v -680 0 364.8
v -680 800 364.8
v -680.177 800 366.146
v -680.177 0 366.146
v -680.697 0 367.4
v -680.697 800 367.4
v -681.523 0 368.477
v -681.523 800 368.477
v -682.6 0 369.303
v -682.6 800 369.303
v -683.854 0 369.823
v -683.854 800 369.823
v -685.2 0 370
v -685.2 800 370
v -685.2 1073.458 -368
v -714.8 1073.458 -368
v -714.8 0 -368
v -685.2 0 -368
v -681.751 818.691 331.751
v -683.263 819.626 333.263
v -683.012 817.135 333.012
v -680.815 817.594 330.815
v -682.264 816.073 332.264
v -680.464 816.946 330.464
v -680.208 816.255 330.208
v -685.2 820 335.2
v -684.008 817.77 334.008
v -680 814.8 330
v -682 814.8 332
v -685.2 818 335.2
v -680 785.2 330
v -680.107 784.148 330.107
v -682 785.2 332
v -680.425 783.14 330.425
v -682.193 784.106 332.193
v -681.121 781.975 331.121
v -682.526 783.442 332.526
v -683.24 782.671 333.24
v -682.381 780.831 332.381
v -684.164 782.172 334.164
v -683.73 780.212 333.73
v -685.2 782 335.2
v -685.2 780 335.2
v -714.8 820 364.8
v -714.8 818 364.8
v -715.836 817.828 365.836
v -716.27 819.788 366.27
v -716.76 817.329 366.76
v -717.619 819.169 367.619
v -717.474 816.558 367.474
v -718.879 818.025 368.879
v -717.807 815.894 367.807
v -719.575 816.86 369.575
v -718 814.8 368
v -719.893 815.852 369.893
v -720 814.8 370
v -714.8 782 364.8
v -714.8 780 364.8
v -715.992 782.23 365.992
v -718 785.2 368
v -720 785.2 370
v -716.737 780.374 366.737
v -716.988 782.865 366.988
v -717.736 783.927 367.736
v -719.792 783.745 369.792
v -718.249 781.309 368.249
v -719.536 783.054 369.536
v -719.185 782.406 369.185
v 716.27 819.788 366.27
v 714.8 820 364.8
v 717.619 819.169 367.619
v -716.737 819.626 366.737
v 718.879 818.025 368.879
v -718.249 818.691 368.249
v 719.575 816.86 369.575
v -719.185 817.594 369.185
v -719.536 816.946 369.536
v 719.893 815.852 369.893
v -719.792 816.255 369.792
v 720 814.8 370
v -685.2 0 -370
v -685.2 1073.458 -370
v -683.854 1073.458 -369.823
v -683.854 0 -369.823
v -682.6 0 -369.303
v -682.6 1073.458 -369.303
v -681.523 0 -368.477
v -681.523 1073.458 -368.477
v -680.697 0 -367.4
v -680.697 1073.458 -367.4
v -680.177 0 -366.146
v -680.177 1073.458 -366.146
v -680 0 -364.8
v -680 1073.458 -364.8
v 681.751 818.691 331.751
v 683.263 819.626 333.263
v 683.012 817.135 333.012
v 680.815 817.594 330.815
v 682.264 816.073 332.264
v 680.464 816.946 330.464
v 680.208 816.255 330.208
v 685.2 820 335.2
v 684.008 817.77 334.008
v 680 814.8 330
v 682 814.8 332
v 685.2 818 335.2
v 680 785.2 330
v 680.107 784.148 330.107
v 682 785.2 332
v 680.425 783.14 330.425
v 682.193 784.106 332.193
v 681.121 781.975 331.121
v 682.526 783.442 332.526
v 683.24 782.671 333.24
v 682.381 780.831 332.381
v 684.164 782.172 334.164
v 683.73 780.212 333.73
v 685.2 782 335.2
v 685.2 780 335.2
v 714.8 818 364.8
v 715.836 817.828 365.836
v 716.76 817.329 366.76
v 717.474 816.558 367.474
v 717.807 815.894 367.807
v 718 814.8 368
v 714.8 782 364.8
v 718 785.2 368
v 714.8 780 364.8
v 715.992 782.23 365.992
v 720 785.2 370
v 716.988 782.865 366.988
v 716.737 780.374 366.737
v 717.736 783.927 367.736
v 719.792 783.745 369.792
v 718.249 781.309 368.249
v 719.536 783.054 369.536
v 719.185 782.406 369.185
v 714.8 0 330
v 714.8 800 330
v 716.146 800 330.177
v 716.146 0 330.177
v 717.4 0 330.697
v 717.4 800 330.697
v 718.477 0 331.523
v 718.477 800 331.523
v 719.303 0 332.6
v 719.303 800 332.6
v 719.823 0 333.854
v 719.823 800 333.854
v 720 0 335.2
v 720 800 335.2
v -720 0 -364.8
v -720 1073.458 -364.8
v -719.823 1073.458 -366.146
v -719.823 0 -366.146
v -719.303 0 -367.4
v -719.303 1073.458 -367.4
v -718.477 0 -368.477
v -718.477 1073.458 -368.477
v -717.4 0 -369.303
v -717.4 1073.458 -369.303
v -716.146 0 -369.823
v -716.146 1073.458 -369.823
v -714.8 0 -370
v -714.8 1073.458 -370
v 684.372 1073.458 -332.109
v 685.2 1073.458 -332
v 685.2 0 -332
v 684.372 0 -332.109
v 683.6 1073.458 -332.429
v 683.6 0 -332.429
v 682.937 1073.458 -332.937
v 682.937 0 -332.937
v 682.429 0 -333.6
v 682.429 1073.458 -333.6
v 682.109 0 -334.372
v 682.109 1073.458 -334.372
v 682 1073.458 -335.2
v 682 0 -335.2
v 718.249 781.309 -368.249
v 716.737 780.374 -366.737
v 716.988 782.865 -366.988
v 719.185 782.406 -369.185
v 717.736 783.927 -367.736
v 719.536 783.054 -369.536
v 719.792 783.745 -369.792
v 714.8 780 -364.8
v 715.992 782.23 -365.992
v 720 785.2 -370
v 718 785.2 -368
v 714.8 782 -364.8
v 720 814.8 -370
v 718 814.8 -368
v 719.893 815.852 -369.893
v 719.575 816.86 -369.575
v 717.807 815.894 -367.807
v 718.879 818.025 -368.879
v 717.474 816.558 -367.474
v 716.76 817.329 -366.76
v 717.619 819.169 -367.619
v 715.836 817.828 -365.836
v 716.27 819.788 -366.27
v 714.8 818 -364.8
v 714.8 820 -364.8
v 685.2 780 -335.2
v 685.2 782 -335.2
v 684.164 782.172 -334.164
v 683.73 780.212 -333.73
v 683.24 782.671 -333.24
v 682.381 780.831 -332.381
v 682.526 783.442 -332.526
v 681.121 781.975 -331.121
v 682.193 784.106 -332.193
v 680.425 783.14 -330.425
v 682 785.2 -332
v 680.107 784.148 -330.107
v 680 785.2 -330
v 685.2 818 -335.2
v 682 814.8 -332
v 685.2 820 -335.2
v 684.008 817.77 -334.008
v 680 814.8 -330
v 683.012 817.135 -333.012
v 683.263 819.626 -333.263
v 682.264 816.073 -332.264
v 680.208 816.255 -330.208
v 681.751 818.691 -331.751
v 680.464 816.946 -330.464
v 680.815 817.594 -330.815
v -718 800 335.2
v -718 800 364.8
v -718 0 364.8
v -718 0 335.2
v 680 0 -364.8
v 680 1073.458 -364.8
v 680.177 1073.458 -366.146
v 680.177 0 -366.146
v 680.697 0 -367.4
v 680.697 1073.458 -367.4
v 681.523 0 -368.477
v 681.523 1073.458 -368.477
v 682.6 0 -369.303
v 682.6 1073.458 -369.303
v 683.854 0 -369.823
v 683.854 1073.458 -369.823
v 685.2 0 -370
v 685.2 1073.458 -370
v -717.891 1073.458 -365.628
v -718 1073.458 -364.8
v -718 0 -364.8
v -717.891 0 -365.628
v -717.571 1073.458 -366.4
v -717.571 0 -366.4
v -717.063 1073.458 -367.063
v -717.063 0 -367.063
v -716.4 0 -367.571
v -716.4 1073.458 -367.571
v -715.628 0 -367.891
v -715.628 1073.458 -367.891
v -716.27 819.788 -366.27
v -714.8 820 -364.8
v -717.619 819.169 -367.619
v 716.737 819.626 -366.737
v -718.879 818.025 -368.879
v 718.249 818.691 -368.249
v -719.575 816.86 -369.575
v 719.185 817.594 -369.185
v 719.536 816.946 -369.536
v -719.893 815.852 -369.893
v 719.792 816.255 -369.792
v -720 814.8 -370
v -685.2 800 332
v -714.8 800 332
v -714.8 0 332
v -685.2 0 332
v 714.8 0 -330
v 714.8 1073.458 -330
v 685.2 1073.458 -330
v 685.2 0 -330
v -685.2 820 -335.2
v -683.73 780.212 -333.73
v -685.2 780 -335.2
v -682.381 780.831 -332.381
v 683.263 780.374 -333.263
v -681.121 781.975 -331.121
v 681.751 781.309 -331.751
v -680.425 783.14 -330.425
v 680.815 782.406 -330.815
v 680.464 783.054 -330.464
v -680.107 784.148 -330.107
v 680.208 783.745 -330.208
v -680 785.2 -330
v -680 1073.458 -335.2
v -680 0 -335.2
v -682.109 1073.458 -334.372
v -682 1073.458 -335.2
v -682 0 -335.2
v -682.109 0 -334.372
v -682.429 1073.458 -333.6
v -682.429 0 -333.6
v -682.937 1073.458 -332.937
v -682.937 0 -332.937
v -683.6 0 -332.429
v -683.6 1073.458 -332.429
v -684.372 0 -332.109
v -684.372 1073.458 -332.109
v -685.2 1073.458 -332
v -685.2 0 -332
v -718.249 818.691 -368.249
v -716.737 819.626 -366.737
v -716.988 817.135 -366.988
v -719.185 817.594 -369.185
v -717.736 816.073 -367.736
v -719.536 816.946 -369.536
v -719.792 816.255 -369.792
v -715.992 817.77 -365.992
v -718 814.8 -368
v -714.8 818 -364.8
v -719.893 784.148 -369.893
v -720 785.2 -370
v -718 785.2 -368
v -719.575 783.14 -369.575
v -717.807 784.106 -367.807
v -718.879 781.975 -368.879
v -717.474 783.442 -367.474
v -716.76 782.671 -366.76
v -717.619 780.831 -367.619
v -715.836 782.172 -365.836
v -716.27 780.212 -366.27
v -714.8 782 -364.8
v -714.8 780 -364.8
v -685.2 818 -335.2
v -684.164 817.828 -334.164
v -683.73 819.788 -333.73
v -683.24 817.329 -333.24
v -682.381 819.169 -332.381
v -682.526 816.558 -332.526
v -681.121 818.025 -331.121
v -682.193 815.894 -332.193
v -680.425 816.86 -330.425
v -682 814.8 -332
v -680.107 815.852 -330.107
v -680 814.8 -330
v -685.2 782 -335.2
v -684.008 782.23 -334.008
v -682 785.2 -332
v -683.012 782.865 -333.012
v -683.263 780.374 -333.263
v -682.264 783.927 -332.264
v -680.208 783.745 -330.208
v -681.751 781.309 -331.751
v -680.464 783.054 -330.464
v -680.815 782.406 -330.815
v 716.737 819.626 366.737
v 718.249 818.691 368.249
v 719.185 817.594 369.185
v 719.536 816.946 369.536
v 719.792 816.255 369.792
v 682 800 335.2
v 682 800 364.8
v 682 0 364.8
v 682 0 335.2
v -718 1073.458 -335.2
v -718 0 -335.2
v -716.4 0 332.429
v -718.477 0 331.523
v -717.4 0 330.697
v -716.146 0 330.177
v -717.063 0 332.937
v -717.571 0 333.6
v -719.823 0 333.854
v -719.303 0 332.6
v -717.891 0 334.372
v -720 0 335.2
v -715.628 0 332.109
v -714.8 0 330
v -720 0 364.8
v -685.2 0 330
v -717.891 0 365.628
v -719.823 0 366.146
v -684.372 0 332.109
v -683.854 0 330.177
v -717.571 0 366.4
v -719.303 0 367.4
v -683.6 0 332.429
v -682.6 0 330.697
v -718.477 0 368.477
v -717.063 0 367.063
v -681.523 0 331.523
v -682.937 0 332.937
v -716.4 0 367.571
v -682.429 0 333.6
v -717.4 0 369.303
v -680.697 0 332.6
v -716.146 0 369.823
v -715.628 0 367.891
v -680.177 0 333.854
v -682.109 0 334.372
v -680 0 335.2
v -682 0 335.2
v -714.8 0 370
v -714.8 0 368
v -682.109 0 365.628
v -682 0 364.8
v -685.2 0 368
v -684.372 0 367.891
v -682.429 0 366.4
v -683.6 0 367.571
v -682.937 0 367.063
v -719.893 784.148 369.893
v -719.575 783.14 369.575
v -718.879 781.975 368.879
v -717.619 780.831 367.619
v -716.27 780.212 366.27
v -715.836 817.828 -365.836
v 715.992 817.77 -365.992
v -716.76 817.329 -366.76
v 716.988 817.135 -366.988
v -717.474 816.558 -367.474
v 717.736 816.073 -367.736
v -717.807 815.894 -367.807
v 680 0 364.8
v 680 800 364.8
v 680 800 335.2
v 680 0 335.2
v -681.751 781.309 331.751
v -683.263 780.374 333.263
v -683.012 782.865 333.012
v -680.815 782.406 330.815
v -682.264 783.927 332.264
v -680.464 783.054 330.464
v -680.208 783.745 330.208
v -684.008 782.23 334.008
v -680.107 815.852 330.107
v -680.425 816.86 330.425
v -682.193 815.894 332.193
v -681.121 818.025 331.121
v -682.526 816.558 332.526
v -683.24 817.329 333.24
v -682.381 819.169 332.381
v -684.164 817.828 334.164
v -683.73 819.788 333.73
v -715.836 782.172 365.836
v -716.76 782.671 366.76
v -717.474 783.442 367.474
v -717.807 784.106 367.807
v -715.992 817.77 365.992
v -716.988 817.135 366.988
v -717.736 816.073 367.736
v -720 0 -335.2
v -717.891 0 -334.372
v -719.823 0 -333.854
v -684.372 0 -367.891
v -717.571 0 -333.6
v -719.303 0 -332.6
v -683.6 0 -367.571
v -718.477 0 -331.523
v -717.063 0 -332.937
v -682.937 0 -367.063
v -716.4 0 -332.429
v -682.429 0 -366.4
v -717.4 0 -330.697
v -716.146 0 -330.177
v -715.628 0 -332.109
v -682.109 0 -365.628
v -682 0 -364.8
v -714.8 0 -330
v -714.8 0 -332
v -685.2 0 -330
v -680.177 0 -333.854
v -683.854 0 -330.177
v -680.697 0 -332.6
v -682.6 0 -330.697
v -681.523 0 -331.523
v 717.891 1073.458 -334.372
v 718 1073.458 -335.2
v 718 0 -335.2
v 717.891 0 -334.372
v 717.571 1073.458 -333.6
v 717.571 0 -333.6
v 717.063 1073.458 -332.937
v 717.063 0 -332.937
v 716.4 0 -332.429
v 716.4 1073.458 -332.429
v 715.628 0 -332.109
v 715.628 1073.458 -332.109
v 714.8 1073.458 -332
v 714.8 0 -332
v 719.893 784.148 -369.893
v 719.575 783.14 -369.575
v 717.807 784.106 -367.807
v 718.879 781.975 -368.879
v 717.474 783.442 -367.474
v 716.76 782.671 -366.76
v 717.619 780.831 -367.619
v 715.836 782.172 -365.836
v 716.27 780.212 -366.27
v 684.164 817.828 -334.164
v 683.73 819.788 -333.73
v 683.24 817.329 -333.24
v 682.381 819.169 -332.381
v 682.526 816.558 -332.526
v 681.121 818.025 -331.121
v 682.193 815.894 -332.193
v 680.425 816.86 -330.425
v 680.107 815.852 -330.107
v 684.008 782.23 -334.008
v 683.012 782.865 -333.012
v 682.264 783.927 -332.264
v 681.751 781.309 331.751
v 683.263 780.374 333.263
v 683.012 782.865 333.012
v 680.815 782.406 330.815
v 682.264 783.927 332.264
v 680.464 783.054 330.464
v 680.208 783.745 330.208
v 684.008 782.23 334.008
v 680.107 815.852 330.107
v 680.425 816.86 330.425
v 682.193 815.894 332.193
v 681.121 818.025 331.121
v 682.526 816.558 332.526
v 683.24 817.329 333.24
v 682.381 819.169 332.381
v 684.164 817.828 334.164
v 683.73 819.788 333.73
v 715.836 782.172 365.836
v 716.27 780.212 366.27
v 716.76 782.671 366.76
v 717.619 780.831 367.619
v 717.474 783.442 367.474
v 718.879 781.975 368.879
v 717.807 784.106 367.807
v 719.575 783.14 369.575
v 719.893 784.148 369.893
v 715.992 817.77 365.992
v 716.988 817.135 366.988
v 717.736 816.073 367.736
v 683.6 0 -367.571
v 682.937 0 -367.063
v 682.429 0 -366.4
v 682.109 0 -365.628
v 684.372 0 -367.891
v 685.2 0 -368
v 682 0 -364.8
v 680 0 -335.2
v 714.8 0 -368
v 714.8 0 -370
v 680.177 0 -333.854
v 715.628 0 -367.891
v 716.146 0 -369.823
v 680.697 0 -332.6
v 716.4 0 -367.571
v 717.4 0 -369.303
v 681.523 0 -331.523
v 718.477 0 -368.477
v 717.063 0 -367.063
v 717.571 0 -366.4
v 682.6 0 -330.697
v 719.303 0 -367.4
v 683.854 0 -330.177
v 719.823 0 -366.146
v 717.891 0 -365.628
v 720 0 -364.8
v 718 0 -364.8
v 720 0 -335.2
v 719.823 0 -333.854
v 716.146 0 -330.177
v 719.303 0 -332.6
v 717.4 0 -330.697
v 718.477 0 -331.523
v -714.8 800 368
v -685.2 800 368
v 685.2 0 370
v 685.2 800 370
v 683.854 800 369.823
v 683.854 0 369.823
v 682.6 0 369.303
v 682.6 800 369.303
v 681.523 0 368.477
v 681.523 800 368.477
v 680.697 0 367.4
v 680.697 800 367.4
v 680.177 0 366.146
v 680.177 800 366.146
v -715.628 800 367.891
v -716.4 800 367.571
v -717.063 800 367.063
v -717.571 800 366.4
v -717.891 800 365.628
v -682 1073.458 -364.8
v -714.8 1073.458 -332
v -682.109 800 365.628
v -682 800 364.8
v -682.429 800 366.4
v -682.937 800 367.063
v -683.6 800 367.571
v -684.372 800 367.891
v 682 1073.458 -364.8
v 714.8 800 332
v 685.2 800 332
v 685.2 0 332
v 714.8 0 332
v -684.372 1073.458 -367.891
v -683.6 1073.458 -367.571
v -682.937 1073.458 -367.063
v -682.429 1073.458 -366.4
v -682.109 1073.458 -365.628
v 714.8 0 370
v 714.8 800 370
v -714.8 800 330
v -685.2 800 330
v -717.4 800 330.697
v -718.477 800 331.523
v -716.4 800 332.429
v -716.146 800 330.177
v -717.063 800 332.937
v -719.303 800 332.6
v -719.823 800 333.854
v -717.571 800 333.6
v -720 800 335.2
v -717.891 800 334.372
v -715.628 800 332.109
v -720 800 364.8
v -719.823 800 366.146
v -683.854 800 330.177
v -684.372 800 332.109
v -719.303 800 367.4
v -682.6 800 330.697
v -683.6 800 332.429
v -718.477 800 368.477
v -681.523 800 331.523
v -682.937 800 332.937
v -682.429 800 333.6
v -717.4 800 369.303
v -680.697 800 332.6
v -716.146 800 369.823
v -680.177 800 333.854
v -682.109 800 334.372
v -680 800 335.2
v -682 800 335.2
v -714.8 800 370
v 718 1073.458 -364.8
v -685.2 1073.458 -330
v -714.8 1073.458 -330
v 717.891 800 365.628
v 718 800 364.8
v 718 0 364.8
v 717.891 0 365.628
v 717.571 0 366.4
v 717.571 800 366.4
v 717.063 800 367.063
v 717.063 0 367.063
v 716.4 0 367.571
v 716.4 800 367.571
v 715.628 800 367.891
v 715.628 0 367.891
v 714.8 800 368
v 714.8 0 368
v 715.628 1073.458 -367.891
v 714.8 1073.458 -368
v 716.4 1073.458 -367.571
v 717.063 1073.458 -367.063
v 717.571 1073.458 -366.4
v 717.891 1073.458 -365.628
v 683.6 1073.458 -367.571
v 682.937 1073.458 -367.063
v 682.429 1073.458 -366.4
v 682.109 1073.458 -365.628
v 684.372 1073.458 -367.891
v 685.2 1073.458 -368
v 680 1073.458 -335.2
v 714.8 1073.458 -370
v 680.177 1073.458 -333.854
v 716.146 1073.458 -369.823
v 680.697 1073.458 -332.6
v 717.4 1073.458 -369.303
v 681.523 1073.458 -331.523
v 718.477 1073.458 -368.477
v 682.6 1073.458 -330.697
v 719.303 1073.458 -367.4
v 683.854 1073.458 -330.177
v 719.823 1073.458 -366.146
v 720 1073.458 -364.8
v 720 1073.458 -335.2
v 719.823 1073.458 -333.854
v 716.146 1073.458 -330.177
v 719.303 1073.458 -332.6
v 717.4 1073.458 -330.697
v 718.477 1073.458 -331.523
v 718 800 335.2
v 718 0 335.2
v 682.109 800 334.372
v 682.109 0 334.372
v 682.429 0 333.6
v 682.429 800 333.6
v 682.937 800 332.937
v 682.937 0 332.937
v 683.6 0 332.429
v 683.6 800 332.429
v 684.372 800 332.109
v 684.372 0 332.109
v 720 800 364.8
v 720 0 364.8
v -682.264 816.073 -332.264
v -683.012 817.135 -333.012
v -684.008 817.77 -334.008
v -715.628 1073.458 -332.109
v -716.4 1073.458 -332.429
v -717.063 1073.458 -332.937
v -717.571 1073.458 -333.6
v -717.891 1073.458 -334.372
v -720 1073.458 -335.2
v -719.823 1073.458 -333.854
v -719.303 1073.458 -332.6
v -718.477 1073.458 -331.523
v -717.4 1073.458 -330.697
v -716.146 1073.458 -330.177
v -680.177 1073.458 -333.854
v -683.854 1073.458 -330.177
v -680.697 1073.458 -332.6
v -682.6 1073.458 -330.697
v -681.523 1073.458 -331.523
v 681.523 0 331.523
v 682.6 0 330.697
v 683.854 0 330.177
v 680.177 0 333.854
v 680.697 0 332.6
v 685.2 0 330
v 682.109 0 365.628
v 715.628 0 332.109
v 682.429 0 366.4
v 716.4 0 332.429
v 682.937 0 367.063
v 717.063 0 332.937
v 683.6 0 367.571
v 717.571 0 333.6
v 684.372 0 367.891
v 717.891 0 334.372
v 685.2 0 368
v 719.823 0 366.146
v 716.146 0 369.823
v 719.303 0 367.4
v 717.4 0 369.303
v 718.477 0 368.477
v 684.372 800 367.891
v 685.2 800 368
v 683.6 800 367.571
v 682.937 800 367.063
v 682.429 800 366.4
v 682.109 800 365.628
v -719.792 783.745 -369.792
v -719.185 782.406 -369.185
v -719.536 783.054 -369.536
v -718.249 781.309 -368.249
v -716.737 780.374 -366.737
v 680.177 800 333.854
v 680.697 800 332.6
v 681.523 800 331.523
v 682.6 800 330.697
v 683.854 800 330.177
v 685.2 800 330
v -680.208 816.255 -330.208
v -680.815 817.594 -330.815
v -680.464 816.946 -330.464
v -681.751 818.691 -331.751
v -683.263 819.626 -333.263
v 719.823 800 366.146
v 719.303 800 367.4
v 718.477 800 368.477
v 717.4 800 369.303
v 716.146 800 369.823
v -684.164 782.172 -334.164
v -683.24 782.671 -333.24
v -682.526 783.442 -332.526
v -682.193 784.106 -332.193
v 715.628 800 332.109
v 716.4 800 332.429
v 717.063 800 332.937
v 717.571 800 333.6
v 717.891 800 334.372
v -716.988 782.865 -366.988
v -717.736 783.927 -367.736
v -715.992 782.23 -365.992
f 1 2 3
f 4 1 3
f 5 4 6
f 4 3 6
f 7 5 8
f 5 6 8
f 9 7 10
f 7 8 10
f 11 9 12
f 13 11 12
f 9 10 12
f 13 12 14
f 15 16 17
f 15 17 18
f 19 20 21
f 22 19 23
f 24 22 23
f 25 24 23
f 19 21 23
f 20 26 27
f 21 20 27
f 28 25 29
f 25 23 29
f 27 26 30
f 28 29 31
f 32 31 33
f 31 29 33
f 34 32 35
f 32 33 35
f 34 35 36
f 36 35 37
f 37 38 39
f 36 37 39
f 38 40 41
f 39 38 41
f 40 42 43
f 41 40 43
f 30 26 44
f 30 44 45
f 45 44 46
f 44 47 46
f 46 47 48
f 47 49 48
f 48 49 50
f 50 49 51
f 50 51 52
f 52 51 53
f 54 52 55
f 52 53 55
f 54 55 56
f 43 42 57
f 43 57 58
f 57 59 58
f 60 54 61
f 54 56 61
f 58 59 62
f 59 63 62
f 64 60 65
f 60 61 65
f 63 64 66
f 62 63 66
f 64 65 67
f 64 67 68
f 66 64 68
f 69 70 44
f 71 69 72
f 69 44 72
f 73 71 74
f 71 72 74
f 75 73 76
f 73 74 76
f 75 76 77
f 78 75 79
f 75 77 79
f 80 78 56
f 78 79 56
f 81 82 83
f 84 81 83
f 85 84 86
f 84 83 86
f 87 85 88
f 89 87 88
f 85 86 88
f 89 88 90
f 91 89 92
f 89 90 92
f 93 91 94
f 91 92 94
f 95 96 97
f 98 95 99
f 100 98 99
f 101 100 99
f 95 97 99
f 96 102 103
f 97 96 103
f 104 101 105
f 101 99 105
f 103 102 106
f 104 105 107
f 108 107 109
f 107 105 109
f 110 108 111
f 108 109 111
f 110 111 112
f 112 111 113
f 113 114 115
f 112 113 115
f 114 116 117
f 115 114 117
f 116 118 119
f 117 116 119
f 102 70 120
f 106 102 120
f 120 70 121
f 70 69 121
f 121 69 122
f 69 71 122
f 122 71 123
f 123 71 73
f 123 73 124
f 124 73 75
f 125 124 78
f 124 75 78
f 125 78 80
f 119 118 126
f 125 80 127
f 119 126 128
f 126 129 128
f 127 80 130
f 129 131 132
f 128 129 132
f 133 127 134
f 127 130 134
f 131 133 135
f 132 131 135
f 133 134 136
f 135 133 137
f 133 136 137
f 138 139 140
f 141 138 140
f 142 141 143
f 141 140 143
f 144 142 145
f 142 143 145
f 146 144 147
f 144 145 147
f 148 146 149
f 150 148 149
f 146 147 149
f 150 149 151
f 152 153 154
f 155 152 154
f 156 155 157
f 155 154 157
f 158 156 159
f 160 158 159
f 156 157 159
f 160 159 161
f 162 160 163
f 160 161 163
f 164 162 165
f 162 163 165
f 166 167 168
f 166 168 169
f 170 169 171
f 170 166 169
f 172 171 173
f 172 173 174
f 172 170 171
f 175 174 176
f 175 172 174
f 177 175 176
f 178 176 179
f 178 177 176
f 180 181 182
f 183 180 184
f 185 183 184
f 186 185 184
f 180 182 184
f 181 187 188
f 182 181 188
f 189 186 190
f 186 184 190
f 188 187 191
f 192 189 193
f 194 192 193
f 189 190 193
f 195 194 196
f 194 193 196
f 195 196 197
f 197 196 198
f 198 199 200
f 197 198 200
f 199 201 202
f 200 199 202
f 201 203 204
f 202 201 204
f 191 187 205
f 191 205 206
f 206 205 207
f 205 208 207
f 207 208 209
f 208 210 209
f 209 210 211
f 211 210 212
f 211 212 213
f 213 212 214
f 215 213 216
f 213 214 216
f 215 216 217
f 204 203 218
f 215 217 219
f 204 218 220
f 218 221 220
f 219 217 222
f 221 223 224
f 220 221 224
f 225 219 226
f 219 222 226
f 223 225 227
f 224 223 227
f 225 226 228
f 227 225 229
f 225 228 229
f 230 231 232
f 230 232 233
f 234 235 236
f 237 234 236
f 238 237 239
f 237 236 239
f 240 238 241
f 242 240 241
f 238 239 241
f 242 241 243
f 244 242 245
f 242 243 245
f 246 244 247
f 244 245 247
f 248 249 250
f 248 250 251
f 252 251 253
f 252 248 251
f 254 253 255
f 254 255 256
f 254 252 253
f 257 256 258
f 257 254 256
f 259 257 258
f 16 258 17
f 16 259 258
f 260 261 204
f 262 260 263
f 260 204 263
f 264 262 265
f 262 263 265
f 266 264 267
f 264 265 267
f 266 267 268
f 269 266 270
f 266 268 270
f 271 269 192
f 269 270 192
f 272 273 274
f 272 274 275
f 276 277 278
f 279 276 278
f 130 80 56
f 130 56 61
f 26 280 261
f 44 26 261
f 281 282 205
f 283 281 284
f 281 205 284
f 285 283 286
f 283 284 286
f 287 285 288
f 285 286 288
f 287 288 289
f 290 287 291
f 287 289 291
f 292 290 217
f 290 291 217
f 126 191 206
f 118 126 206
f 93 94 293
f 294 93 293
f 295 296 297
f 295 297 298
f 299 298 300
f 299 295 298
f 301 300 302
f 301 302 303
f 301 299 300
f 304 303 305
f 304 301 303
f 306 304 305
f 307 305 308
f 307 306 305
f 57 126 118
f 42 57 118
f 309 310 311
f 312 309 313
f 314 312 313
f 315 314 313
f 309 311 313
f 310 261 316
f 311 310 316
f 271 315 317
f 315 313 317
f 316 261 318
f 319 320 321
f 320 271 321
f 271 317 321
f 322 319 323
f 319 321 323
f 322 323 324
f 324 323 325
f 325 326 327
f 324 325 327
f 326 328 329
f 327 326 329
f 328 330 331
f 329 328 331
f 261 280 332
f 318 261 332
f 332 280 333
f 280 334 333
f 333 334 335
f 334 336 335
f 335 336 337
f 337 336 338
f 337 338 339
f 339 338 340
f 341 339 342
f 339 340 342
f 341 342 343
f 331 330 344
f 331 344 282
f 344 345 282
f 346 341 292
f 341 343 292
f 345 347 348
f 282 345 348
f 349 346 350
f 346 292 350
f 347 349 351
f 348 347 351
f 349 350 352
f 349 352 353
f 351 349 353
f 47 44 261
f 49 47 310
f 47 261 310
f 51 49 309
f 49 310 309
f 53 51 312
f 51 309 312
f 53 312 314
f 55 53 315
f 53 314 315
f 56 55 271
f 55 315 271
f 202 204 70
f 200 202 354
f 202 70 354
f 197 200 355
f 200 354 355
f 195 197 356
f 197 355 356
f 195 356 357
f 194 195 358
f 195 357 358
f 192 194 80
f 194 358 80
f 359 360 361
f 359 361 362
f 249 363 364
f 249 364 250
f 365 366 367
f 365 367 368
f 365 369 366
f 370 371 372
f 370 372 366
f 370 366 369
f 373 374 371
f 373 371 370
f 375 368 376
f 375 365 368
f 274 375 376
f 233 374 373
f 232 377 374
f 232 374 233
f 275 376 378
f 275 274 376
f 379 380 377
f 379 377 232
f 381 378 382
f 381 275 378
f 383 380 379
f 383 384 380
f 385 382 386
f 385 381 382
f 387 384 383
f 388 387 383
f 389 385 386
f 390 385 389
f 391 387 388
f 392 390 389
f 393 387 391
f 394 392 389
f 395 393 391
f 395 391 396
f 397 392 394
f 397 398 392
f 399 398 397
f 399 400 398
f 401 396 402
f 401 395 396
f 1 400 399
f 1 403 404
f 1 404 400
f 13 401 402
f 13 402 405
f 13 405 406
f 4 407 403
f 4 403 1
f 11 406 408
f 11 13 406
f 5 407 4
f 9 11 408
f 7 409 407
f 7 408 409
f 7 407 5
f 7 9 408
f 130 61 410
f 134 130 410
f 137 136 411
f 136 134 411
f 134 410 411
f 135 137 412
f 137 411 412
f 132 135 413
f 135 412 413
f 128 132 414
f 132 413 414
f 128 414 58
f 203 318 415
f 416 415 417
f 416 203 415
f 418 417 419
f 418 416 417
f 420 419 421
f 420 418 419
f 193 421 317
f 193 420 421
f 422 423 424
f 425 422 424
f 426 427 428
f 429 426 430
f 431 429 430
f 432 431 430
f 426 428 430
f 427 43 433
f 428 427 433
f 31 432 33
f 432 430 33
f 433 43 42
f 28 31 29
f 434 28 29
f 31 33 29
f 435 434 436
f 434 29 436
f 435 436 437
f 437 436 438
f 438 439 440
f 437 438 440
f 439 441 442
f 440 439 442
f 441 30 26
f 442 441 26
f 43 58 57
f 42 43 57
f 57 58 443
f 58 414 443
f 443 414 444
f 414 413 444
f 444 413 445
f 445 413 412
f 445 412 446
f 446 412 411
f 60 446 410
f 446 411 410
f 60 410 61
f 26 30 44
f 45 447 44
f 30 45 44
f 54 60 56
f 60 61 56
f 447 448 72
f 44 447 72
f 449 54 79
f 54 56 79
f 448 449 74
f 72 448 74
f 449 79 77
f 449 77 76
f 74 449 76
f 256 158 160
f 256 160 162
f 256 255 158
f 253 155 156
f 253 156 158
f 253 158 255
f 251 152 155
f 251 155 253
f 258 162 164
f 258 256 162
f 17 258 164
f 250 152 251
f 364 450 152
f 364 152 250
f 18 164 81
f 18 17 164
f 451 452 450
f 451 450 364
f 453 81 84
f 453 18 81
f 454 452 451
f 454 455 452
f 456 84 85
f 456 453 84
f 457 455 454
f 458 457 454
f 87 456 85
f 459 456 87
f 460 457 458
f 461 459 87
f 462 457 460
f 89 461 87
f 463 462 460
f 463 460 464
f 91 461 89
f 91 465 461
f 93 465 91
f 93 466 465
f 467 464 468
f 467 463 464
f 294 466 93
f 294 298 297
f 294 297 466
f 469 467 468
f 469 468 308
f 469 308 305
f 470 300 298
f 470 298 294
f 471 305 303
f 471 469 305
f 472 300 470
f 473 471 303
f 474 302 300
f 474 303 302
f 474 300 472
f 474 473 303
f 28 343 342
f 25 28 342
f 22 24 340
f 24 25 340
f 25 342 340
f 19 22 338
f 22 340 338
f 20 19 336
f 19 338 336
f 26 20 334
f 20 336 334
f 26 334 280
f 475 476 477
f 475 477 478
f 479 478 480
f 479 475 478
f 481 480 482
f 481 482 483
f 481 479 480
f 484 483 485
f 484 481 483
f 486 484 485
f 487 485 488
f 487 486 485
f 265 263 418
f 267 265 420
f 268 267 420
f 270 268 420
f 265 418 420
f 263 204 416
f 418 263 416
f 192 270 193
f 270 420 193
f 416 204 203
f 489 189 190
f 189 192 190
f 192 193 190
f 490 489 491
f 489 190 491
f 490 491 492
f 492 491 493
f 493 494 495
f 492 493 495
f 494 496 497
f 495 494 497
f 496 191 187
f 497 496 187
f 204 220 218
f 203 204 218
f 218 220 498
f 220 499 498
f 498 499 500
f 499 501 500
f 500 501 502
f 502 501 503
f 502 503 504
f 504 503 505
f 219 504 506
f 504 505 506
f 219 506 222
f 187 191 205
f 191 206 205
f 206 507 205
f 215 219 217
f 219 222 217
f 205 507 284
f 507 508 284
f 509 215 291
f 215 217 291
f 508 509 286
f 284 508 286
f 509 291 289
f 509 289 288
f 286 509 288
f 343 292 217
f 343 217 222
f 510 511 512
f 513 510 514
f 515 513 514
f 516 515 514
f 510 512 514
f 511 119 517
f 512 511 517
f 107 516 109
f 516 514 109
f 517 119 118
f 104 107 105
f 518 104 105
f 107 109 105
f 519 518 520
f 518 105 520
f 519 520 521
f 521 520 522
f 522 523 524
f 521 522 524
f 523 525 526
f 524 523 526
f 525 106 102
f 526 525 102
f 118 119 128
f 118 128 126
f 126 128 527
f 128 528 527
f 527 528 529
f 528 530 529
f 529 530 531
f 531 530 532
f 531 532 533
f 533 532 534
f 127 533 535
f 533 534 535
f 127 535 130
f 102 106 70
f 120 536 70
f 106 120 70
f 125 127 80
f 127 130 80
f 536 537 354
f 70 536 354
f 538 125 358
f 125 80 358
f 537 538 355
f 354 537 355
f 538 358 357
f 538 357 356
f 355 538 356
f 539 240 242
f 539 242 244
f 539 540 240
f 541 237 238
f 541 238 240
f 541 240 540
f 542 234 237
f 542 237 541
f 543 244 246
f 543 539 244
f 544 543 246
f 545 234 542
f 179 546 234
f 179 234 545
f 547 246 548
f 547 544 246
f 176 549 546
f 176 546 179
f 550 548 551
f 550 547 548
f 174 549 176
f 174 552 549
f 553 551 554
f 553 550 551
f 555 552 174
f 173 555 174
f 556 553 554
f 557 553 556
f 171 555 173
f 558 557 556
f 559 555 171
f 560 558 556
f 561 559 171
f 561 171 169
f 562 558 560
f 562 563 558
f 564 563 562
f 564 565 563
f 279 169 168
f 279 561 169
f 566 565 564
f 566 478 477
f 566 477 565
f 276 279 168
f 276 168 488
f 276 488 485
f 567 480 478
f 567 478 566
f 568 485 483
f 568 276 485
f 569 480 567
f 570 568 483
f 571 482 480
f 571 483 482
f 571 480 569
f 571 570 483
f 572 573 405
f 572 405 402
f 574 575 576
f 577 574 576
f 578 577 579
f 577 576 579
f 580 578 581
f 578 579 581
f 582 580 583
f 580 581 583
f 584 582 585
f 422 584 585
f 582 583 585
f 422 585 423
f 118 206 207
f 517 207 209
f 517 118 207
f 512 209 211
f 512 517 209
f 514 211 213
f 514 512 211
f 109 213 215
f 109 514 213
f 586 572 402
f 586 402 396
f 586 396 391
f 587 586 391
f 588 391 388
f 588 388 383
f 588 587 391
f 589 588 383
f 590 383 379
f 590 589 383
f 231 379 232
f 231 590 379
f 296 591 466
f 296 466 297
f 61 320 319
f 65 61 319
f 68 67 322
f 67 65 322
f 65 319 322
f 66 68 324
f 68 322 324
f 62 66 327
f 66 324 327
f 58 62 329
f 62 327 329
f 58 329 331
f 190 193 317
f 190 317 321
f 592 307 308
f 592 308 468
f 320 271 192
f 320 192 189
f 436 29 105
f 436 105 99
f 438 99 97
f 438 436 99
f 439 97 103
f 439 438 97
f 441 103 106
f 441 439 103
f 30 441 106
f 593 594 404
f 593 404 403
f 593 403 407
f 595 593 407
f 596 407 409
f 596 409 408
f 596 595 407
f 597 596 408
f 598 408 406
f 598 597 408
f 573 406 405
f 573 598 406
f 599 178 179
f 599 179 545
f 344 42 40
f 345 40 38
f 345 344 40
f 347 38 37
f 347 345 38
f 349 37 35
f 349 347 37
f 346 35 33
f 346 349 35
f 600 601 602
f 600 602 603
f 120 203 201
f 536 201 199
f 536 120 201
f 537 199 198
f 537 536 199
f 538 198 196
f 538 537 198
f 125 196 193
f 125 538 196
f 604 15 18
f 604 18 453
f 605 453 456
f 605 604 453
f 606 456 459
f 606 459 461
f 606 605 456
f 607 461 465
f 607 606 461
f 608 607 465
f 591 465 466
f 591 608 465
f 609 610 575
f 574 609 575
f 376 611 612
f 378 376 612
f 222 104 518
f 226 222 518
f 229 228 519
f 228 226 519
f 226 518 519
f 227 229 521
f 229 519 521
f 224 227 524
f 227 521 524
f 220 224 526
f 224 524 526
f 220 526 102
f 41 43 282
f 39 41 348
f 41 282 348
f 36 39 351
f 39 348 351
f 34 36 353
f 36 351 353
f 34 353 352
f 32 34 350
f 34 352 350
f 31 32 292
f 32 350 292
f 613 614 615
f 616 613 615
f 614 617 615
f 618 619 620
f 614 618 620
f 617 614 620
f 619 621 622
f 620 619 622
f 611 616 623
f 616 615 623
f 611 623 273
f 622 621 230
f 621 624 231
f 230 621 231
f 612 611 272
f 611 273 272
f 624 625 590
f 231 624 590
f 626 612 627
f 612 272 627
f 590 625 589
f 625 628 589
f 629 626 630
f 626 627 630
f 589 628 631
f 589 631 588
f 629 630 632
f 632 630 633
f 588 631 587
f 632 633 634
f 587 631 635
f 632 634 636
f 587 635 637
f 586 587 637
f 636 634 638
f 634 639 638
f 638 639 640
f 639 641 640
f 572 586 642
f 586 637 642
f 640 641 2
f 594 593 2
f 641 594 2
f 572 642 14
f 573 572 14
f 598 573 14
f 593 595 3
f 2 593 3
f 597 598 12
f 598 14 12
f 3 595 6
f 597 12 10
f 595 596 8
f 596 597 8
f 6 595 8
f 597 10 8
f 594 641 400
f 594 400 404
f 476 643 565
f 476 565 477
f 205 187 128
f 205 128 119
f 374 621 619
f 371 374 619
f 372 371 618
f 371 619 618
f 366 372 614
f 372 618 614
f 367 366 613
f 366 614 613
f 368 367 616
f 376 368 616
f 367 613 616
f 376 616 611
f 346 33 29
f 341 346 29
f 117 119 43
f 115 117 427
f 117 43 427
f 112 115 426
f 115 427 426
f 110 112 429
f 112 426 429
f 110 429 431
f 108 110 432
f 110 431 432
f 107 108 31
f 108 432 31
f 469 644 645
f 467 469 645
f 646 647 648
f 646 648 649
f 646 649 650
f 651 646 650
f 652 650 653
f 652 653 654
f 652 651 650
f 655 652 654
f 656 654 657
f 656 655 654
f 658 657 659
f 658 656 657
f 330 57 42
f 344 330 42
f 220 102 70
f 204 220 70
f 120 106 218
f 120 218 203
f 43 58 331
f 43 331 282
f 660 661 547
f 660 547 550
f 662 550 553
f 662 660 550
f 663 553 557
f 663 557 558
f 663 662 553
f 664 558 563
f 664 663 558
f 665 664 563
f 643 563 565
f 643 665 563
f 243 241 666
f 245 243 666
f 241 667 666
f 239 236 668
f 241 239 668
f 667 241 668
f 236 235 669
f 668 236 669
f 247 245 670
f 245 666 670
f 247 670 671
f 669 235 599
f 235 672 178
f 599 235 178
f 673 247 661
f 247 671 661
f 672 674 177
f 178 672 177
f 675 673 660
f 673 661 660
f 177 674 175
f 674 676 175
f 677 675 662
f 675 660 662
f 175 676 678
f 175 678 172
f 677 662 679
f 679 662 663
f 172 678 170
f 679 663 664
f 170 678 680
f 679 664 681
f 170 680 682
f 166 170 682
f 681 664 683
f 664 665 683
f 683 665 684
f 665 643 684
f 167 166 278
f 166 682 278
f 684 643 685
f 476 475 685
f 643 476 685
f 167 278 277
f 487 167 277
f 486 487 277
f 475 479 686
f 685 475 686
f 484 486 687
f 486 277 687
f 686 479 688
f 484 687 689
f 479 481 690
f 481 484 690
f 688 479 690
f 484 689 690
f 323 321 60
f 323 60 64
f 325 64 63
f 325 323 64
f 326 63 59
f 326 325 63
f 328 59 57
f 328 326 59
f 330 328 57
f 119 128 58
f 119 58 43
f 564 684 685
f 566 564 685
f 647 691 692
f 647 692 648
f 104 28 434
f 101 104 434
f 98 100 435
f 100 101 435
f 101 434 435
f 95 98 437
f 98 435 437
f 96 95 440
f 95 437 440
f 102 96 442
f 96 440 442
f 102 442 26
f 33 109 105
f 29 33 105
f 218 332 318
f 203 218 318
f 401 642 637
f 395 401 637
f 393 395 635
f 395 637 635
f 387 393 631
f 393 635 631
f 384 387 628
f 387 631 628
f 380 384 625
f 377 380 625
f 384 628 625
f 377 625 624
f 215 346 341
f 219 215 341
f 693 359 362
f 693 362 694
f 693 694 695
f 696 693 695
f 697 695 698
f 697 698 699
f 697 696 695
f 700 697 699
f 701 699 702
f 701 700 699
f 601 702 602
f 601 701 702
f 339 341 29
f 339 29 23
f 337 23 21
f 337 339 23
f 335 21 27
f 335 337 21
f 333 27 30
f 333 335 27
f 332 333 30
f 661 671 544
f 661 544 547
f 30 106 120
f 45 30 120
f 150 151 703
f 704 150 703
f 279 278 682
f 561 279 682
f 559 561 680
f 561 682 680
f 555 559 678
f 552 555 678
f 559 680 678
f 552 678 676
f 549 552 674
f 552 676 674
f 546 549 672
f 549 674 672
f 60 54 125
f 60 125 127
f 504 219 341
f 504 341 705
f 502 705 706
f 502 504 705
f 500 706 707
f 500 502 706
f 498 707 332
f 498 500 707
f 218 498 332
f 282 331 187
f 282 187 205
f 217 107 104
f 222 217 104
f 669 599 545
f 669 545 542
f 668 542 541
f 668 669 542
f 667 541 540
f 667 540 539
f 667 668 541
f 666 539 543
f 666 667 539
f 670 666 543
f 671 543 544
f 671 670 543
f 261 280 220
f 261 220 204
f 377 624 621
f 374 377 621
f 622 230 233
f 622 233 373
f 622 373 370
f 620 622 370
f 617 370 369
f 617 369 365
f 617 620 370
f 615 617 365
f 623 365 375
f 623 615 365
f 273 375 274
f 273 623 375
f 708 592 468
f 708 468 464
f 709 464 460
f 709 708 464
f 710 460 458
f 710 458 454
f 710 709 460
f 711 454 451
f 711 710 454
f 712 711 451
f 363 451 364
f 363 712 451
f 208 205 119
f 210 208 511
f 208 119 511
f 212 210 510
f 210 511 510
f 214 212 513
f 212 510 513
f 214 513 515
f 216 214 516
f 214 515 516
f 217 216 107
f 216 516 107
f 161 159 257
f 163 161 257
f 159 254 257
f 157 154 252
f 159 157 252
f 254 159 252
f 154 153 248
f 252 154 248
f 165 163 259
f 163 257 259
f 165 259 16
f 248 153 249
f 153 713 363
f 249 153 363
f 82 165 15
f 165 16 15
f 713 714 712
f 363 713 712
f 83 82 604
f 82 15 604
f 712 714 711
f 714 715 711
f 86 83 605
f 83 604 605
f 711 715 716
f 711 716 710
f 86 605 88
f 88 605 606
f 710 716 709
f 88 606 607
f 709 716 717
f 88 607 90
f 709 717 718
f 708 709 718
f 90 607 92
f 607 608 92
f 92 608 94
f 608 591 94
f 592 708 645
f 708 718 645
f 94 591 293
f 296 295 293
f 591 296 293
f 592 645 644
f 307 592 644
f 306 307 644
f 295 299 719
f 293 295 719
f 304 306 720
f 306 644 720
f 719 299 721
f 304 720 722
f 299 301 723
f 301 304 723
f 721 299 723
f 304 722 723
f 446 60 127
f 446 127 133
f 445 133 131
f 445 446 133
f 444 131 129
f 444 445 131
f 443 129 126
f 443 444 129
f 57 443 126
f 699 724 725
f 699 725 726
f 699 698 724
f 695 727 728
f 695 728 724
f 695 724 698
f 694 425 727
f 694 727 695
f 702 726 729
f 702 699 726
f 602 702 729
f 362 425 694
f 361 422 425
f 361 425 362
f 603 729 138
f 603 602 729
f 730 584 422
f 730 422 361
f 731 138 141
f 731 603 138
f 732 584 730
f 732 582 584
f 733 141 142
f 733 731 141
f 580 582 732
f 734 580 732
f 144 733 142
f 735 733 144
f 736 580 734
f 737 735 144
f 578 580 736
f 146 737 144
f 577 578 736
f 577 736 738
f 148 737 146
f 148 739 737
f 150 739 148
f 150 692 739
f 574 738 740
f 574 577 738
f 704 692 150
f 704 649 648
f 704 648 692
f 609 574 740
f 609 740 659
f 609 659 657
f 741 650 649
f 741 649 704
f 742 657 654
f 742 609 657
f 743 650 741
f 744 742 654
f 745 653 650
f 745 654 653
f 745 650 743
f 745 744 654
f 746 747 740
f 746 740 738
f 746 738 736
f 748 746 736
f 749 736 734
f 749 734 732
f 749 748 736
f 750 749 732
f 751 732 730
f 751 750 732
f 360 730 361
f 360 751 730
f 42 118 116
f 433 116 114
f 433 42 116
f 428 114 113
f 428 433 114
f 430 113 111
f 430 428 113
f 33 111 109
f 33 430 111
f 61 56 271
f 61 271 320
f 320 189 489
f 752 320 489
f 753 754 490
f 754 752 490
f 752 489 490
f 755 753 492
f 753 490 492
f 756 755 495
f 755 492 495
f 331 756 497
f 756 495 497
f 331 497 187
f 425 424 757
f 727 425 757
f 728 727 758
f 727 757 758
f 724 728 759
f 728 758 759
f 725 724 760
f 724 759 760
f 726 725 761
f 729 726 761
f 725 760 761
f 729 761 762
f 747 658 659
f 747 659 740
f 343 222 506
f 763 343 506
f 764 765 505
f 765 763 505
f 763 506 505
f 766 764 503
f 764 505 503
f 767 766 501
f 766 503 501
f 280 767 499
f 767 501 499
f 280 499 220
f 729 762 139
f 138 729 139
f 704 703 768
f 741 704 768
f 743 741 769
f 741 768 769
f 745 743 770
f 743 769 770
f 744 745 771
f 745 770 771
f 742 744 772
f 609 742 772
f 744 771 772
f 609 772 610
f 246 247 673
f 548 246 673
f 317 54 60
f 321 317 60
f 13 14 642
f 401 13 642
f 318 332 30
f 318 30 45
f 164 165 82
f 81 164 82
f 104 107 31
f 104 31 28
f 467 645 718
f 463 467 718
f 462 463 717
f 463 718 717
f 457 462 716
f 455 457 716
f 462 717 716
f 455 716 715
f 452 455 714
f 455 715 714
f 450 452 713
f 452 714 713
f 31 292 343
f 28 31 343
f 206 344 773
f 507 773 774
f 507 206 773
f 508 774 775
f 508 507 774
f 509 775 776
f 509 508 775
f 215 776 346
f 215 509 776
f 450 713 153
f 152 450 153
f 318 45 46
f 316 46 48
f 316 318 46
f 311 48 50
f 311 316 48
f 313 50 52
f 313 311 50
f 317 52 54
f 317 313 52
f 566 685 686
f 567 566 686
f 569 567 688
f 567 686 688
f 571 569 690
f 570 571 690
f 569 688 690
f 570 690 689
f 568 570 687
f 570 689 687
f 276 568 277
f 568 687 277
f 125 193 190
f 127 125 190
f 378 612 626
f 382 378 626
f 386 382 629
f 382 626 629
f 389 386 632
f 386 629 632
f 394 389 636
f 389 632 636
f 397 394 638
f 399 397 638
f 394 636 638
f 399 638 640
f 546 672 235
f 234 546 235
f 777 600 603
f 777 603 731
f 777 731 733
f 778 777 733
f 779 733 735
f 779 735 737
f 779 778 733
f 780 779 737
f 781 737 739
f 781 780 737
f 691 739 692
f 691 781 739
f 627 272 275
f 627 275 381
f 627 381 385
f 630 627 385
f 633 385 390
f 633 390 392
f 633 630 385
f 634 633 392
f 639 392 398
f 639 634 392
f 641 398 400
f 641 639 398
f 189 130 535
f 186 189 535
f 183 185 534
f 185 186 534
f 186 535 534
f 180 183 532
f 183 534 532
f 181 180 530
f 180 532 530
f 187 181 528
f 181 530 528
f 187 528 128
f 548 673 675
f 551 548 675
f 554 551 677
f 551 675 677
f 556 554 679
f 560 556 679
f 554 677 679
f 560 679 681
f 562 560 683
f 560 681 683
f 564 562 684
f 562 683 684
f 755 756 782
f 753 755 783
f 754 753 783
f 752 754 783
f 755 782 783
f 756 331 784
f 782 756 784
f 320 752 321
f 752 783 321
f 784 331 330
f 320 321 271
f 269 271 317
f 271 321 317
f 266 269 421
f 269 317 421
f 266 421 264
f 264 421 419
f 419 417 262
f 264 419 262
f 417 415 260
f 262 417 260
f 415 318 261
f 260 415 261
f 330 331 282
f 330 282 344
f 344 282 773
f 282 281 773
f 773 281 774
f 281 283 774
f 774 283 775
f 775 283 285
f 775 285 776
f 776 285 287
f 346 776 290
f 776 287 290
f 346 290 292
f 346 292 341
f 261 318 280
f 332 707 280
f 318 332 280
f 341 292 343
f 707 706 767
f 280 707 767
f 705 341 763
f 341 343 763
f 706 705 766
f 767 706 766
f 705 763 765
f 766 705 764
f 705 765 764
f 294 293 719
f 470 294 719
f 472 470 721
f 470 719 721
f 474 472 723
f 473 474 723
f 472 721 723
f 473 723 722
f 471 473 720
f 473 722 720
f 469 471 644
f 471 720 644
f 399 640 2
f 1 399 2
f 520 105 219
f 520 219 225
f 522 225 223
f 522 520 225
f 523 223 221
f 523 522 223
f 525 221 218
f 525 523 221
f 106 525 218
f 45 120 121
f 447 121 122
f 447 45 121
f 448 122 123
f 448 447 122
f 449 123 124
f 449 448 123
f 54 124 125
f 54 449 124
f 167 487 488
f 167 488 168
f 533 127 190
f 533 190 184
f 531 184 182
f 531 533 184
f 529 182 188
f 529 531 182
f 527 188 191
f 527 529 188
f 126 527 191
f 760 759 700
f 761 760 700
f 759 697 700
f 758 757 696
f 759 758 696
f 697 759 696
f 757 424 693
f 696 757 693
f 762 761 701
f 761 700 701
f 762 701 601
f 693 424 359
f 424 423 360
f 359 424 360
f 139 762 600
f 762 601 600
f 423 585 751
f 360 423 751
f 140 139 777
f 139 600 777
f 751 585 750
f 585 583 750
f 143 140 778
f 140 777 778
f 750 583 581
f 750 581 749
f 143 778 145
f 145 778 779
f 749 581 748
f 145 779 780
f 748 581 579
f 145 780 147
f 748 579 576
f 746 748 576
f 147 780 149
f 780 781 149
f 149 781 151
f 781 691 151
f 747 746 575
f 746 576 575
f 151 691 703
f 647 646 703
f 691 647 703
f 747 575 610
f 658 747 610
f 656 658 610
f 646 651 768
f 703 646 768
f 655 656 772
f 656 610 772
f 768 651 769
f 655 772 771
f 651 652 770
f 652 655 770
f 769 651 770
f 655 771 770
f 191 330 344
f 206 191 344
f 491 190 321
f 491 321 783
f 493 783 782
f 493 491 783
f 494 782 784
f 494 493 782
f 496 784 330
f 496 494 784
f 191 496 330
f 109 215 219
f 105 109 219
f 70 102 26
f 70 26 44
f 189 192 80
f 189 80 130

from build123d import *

# Parameters (mm, degrees)
RECTANGULAR_TUBE_CONFIGURED_40_X_40_X_DEPTH      = 1429.284271247
RECTANGULAR_TUBE_CONFIGURED_40_X_40_X_DEPTH_BACK = 29.284271247
RECTANGULAR_TUBE_CONFIGURED_40_X_4_4_DEPTH       = 758.568542495
RECTANGULAR_TUBE_CONFIGURED_40_X_4_6_DEPTH       = 1458.568542495
RECTANGULAR_TUBE_CONFIGURED_40_X_4_8_DEPTH       = 758.568542495
RECTANGULAR_TUBE_CONFIGURED_40_X_4_10_DEPTH      = 1073.458017645
RECTANGULAR_TUBE_CONFIGURED_40_X_4_11_DEPTH      = 1073.458017645
RECTANGULAR_TUBE_CONFIGURED_40_X_4_12_DEPTH      = 800
RECTANGULAR_TUBE_CONFIGURED_40_X_4_13_DEPTH      = 800


with BuildPart() as part:
    # Sketch12 → Rectangular tube - configured 40 X 40 X (new, two sides: drawn at the far end of the back side and taken through both)
    with BuildSketch(Plane(origin=(-700, 800, 350), x_dir=(0, 0, -1), z_dir=(1, 0, 0)).offset(-RECTANGULAR_TUBE_CONFIGURED_40_X_40_X_DEPTH_BACK)):
        with BuildLine():
            Line((-14.8, -20), (14.8, -20))
            ThreePointArc((14.8, -20), (18.476955262, -18.476955262), (20, -14.8))
            Line((20, -14.8), (20, 14.8))
            ThreePointArc((20, 14.8), (18.476955262, 18.476955262), (14.8, 20))
            Line((14.8, 20), (-14.8, 20))
            ThreePointArc((-14.8, 20), (-18.476955262, 18.476955262), (-20, 14.8))
            Line((-20, 14.8), (-20, -14.8))
            ThreePointArc((-20, -14.8), (-18.476955262, -18.476955262), (-14.8, -20))
        make_face()
        with BuildLine():
            Line((-14.8, -18), (14.8, -18))
            ThreePointArc((14.8, -18), (17.0627417, -17.0627417), (18, -14.8))
            Line((18, -14.8), (18, 14.8))
            ThreePointArc((18, 14.8), (17.0627417, 17.0627417), (14.8, 18))
            Line((14.8, 18), (-14.8, 18))
            ThreePointArc((-14.8, 18), (-17.0627417, 17.0627417), (-18, 14.8))
            Line((-18, 14.8), (-18, -14.8))
            ThreePointArc((-18, -14.8), (-17.0627417, -17.0627417), (-14.8, -18))
        make_face(mode=Mode.SUBTRACT)
    extrude(amount=RECTANGULAR_TUBE_CONFIGURED_40_X_40_X_DEPTH + RECTANGULAR_TUBE_CONFIGURED_40_X_40_X_DEPTH_BACK)

    # Rectangular tube - configured 40 X 4 2
    split(bisect_by=Plane(origin=(-700, 800, 350), x_dir=(0, 1, 0), z_dir=(0.707106781, 0, 0.707106781)), keep=Keep.TOP)

    # Rectangular tube - configured 40 X 4 3
    split(bisect_by=Plane(origin=(700, 800, 350), x_dir=(0, -1, 0), z_dir=(-0.707106781, 0, 0.707106781)), keep=Keep.TOP)


with BuildPart() as body_2:
    # Sketch12 on segment 2 (carried to segment 2) → Rectangular tube - configured 40 X 4 4 (new body)
    with BuildSketch(Plane(origin=(700, 800, 379.284271247), x_dir=(-1, 0, 0), z_dir=(0, 0, -1))):
        with BuildLine():
            Line((-14.8, -20), (14.8, -20))
            ThreePointArc((14.8, -20), (18.476955262, -18.476955262), (20, -14.8))
            Line((20, -14.8), (20, 14.8))
            ThreePointArc((20, 14.8), (18.476955262, 18.476955262), (14.8, 20))
            Line((14.8, 20), (-14.8, 20))
            ThreePointArc((-14.8, 20), (-18.476955262, 18.476955262), (-20, 14.8))
            Line((-20, 14.8), (-20, -14.8))
            ThreePointArc((-20, -14.8), (-18.476955262, -18.476955262), (-14.8, -20))
        make_face()
        with BuildLine():
            Line((-14.8, -18), (14.8, -18))
            ThreePointArc((14.8, -18), (17.0627417, -17.0627417), (18, -14.8))
            Line((18, -14.8), (18, 14.8))
            ThreePointArc((18, 14.8), (17.0627417, 17.0627417), (14.8, 18))
            Line((14.8, 18), (-14.8, 18))
            ThreePointArc((-14.8, 18), (-17.0627417, 17.0627417), (-18, 14.8))
            Line((-18, 14.8), (-18, -14.8))
            ThreePointArc((-18, -14.8), (-17.0627417, -17.0627417), (-14.8, -18))
        make_face(mode=Mode.SUBTRACT)
    extrude(amount=RECTANGULAR_TUBE_CONFIGURED_40_X_4_4_DEPTH)

    # Rectangular tube - configured 40 X 4 4 m
    split(bisect_by=Plane(origin=(700, 800, 350), x_dir=(0, 1, 0), z_dir=(0.707106781, 0, -0.707106781)), keep=Keep.TOP)

    # Rectangular tube - configured 40 X 4 5
    split(bisect_by=Plane(origin=(700, 800, -350), x_dir=(0, 1, 0), z_dir=(0.707106781, 0, 0.707106781)), keep=Keep.TOP)


with BuildPart() as body_3:
    # Sketch12 on segment 3 (carried to segment 3) → Rectangular tube - configured 40 X 4 6 (new body)
    with BuildSketch(Plane(origin=(729.284271247, 800, -350), x_dir=(0, 0, 1), z_dir=(-1, 0, 0))):
        with BuildLine():
            Line((-14.8, -20), (14.8, -20))
            ThreePointArc((14.8, -20), (18.476955262, -18.476955262), (20, -14.8))
            Line((20, -14.8), (20, 14.8))
            ThreePointArc((20, 14.8), (18.476955262, 18.476955262), (14.8, 20))
            Line((14.8, 20), (-14.8, 20))
            ThreePointArc((-14.8, 20), (-18.476955262, 18.476955262), (-20, 14.8))
            Line((-20, 14.8), (-20, -14.8))
            ThreePointArc((-20, -14.8), (-18.476955262, -18.476955262), (-14.8, -20))
        make_face()
        with BuildLine():
            Line((-14.8, -18), (14.8, -18))
            ThreePointArc((14.8, -18), (17.0627417, -17.0627417), (18, -14.8))
            Line((18, -14.8), (18, 14.8))
            ThreePointArc((18, 14.8), (17.0627417, 17.0627417), (14.8, 18))
            Line((14.8, 18), (-14.8, 18))
            ThreePointArc((-14.8, 18), (-17.0627417, 17.0627417), (-18, 14.8))
            Line((-18, 14.8), (-18, -14.8))
            ThreePointArc((-18, -14.8), (-17.0627417, -17.0627417), (-14.8, -18))
        make_face(mode=Mode.SUBTRACT)
    extrude(amount=RECTANGULAR_TUBE_CONFIGURED_40_X_4_6_DEPTH)

    # Rectangular tube - configured 40 X 4 6 m
    split(bisect_by=Plane(origin=(700, 800, -350), x_dir=(0, -1, 0), z_dir=(-0.707106781, 0, -0.707106781)), keep=Keep.TOP)

    # Rectangular tube - configured 40 X 4 7
    split(bisect_by=Plane(origin=(-700, 800, -350), x_dir=(0, 1, 0), z_dir=(0.707106781, 0, -0.707106781)), keep=Keep.TOP)


with BuildPart() as body_4:
    # Sketch12 on segment 4 (carried to segment 4) → Rectangular tube - configured 40 X 4 8 (new body)
    with BuildSketch(Plane(origin=(-700, 800, -379.284271247), x_dir=(1, 0, 0), z_dir=(0, 0, 1))):
        with BuildLine():
            Line((-14.8, -20), (14.8, -20))
            ThreePointArc((14.8, -20), (18.476955262, -18.476955262), (20, -14.8))
            Line((20, -14.8), (20, 14.8))
            ThreePointArc((20, 14.8), (18.476955262, 18.476955262), (14.8, 20))
            Line((14.8, 20), (-14.8, 20))
            ThreePointArc((-14.8, 20), (-18.476955262, 18.476955262), (-20, 14.8))
            Line((-20, 14.8), (-20, -14.8))
            ThreePointArc((-20, -14.8), (-18.476955262, -18.476955262), (-14.8, -20))
        make_face()
        with BuildLine():
            Line((-14.8, -18), (14.8, -18))
            ThreePointArc((14.8, -18), (17.0627417, -17.0627417), (18, -14.8))
            Line((18, -14.8), (18, 14.8))
            ThreePointArc((18, 14.8), (17.0627417, 17.0627417), (14.8, 18))
            Line((14.8, 18), (-14.8, 18))
            ThreePointArc((-14.8, 18), (-17.0627417, 17.0627417), (-18, 14.8))
            Line((-18, 14.8), (-18, -14.8))
            ThreePointArc((-18, -14.8), (-17.0627417, -17.0627417), (-14.8, -18))
        make_face(mode=Mode.SUBTRACT)
    extrude(amount=RECTANGULAR_TUBE_CONFIGURED_40_X_4_8_DEPTH)

    # Rectangular tube - configured 40 X 4 8 m
    split(bisect_by=Plane(origin=(-700, 800, -350), x_dir=(0, -1, 0), z_dir=(-0.707106781, 0, 0.707106781)), keep=Keep.TOP)

    # Rectangular tube - configured 40 X 4 9
    split(bisect_by=Plane(origin=(-700, 800, 350), x_dir=(0, -1, 0), z_dir=(-0.707106781, 0, -0.707106781)), keep=Keep.TOP)


with BuildPart() as body_5:
    # Sketch1 → Rectangular tube - configured 40 X 4 10 (new body)
    with BuildSketch(Plane(origin=(-700, 1073.458017645, -350), x_dir=(1, 0, 0), z_dir=(0, -1, 0))):
        with BuildLine():
            Line((-14.8, -20), (14.8, -20))
            ThreePointArc((14.8, -20), (18.476955262, -18.476955262), (20, -14.8))
            Line((20, -14.8), (20, 14.8))
            ThreePointArc((20, 14.8), (18.476955262, 18.476955262), (14.8, 20))
            Line((14.8, 20), (-14.8, 20))
            ThreePointArc((-14.8, 20), (-18.476955262, 18.476955262), (-20, 14.8))
            Line((-20, 14.8), (-20, -14.8))
            ThreePointArc((-20, -14.8), (-18.476955262, -18.476955262), (-14.8, -20))
        make_face()
        with BuildLine():
            Line((-14.8, -18), (14.8, -18))
            ThreePointArc((14.8, -18), (17.0627417, -17.0627417), (18, -14.8))
            Line((18, -14.8), (18, 14.8))
            ThreePointArc((18, 14.8), (17.0627417, 17.0627417), (14.8, 18))
            Line((14.8, 18), (-14.8, 18))
            ThreePointArc((-14.8, 18), (-17.0627417, 17.0627417), (-18, 14.8))
            Line((-18, 14.8), (-18, -14.8))
            ThreePointArc((-18, -14.8), (-17.0627417, -17.0627417), (-14.8, -18))
        make_face(mode=Mode.SUBTRACT)
    extrude(amount=RECTANGULAR_TUBE_CONFIGURED_40_X_4_10_DEPTH)


with BuildPart() as body_6:
    # Sketch1 on segment 2 (carried to segment 2) → Rectangular tube - configured 40 X 4 11 (new body)
    with BuildSketch(Plane(origin=(700, 1073.458017645, -350), x_dir=(1, 0, 0), z_dir=(0, -1, 0))):
        with BuildLine():
            Line((-14.8, -20), (14.8, -20))
            ThreePointArc((14.8, -20), (18.476955262, -18.476955262), (20, -14.8))
            Line((20, -14.8), (20, 14.8))
            ThreePointArc((20, 14.8), (18.476955262, 18.476955262), (14.8, 20))
            Line((14.8, 20), (-14.8, 20))
            ThreePointArc((-14.8, 20), (-18.476955262, 18.476955262), (-20, 14.8))
            Line((-20, 14.8), (-20, -14.8))
            ThreePointArc((-20, -14.8), (-18.476955262, -18.476955262), (-14.8, -20))
        make_face()
        with BuildLine():
            Line((-14.8, -18), (14.8, -18))
            ThreePointArc((14.8, -18), (17.0627417, -17.0627417), (18, -14.8))
            Line((18, -14.8), (18, 14.8))
            ThreePointArc((18, 14.8), (17.0627417, 17.0627417), (14.8, 18))
            Line((14.8, 18), (-14.8, 18))
            ThreePointArc((-14.8, 18), (-17.0627417, 17.0627417), (-18, 14.8))
            Line((-18, 14.8), (-18, -14.8))
            ThreePointArc((-18, -14.8), (-17.0627417, -17.0627417), (-14.8, -18))
        make_face(mode=Mode.SUBTRACT)
    extrude(amount=RECTANGULAR_TUBE_CONFIGURED_40_X_4_11_DEPTH)


with BuildPart() as body_7:
    # Sketch1 on segment 3 (carried to segment 3) → Rectangular tube - configured 40 X 4 12 (new body)
    with BuildSketch(Plane(origin=(-700, 800, 350), x_dir=(1, 0, 0), z_dir=(0, -1, 0))):
        with BuildLine():
            Line((-14.8, -20), (14.8, -20))
            ThreePointArc((14.8, -20), (18.476955262, -18.476955262), (20, -14.8))
            Line((20, -14.8), (20, 14.8))
            ThreePointArc((20, 14.8), (18.476955262, 18.476955262), (14.8, 20))
            Line((14.8, 20), (-14.8, 20))
            ThreePointArc((-14.8, 20), (-18.476955262, 18.476955262), (-20, 14.8))
            Line((-20, 14.8), (-20, -14.8))
            ThreePointArc((-20, -14.8), (-18.476955262, -18.476955262), (-14.8, -20))
        make_face()
        with BuildLine():
            Line((-14.8, -18), (14.8, -18))
            ThreePointArc((14.8, -18), (17.0627417, -17.0627417), (18, -14.8))
            Line((18, -14.8), (18, 14.8))
            ThreePointArc((18, 14.8), (17.0627417, 17.0627417), (14.8, 18))
            Line((14.8, 18), (-14.8, 18))
            ThreePointArc((-14.8, 18), (-17.0627417, 17.0627417), (-18, 14.8))
            Line((-18, 14.8), (-18, -14.8))
            ThreePointArc((-18, -14.8), (-17.0627417, -17.0627417), (-14.8, -18))
        make_face(mode=Mode.SUBTRACT)
    extrude(amount=RECTANGULAR_TUBE_CONFIGURED_40_X_4_12_DEPTH)


with BuildPart() as body_8:
    # Sketch1 on segment 4 (carried to segment 4) → Rectangular tube - configured 40 X 4 13 (new body)
    with BuildSketch(Plane(origin=(700, 800, 350), x_dir=(1, 0, 0), z_dir=(0, -1, 0))):
        with BuildLine():
            Line((-14.8, -20), (14.8, -20))
            ThreePointArc((14.8, -20), (18.476955262, -18.476955262), (20, -14.8))
            Line((20, -14.8), (20, 14.8))
            ThreePointArc((20, 14.8), (18.476955262, 18.476955262), (14.8, 20))
            Line((14.8, 20), (-14.8, 20))
            ThreePointArc((-14.8, 20), (-18.476955262, 18.476955262), (-20, 14.8))
            Line((-20, 14.8), (-20, -14.8))
            ThreePointArc((-20, -14.8), (-18.476955262, -18.476955262), (-14.8, -20))
        make_face()
        with BuildLine():
            Line((-14.8, -18), (14.8, -18))
            ThreePointArc((14.8, -18), (17.0627417, -17.0627417), (18, -14.8))
            Line((18, -14.8), (18, 14.8))
            ThreePointArc((18, 14.8), (17.0627417, 17.0627417), (14.8, 18))
            Line((14.8, 18), (-14.8, 18))
            ThreePointArc((-14.8, 18), (-17.0627417, 17.0627417), (-18, 14.8))
            Line((-18, 14.8), (-18, -14.8))
            ThreePointArc((-18, -14.8), (-17.0627417, -17.0627417), (-14.8, -18))
        make_face(mode=Mode.SUBTRACT)
    extrude(amount=RECTANGULAR_TUBE_CONFIGURED_40_X_4_13_DEPTH)


solid = Compound([part.part, body_2.part, body_3.part, body_4.part, body_5.part, body_6.part, body_7.part, body_8.part])
